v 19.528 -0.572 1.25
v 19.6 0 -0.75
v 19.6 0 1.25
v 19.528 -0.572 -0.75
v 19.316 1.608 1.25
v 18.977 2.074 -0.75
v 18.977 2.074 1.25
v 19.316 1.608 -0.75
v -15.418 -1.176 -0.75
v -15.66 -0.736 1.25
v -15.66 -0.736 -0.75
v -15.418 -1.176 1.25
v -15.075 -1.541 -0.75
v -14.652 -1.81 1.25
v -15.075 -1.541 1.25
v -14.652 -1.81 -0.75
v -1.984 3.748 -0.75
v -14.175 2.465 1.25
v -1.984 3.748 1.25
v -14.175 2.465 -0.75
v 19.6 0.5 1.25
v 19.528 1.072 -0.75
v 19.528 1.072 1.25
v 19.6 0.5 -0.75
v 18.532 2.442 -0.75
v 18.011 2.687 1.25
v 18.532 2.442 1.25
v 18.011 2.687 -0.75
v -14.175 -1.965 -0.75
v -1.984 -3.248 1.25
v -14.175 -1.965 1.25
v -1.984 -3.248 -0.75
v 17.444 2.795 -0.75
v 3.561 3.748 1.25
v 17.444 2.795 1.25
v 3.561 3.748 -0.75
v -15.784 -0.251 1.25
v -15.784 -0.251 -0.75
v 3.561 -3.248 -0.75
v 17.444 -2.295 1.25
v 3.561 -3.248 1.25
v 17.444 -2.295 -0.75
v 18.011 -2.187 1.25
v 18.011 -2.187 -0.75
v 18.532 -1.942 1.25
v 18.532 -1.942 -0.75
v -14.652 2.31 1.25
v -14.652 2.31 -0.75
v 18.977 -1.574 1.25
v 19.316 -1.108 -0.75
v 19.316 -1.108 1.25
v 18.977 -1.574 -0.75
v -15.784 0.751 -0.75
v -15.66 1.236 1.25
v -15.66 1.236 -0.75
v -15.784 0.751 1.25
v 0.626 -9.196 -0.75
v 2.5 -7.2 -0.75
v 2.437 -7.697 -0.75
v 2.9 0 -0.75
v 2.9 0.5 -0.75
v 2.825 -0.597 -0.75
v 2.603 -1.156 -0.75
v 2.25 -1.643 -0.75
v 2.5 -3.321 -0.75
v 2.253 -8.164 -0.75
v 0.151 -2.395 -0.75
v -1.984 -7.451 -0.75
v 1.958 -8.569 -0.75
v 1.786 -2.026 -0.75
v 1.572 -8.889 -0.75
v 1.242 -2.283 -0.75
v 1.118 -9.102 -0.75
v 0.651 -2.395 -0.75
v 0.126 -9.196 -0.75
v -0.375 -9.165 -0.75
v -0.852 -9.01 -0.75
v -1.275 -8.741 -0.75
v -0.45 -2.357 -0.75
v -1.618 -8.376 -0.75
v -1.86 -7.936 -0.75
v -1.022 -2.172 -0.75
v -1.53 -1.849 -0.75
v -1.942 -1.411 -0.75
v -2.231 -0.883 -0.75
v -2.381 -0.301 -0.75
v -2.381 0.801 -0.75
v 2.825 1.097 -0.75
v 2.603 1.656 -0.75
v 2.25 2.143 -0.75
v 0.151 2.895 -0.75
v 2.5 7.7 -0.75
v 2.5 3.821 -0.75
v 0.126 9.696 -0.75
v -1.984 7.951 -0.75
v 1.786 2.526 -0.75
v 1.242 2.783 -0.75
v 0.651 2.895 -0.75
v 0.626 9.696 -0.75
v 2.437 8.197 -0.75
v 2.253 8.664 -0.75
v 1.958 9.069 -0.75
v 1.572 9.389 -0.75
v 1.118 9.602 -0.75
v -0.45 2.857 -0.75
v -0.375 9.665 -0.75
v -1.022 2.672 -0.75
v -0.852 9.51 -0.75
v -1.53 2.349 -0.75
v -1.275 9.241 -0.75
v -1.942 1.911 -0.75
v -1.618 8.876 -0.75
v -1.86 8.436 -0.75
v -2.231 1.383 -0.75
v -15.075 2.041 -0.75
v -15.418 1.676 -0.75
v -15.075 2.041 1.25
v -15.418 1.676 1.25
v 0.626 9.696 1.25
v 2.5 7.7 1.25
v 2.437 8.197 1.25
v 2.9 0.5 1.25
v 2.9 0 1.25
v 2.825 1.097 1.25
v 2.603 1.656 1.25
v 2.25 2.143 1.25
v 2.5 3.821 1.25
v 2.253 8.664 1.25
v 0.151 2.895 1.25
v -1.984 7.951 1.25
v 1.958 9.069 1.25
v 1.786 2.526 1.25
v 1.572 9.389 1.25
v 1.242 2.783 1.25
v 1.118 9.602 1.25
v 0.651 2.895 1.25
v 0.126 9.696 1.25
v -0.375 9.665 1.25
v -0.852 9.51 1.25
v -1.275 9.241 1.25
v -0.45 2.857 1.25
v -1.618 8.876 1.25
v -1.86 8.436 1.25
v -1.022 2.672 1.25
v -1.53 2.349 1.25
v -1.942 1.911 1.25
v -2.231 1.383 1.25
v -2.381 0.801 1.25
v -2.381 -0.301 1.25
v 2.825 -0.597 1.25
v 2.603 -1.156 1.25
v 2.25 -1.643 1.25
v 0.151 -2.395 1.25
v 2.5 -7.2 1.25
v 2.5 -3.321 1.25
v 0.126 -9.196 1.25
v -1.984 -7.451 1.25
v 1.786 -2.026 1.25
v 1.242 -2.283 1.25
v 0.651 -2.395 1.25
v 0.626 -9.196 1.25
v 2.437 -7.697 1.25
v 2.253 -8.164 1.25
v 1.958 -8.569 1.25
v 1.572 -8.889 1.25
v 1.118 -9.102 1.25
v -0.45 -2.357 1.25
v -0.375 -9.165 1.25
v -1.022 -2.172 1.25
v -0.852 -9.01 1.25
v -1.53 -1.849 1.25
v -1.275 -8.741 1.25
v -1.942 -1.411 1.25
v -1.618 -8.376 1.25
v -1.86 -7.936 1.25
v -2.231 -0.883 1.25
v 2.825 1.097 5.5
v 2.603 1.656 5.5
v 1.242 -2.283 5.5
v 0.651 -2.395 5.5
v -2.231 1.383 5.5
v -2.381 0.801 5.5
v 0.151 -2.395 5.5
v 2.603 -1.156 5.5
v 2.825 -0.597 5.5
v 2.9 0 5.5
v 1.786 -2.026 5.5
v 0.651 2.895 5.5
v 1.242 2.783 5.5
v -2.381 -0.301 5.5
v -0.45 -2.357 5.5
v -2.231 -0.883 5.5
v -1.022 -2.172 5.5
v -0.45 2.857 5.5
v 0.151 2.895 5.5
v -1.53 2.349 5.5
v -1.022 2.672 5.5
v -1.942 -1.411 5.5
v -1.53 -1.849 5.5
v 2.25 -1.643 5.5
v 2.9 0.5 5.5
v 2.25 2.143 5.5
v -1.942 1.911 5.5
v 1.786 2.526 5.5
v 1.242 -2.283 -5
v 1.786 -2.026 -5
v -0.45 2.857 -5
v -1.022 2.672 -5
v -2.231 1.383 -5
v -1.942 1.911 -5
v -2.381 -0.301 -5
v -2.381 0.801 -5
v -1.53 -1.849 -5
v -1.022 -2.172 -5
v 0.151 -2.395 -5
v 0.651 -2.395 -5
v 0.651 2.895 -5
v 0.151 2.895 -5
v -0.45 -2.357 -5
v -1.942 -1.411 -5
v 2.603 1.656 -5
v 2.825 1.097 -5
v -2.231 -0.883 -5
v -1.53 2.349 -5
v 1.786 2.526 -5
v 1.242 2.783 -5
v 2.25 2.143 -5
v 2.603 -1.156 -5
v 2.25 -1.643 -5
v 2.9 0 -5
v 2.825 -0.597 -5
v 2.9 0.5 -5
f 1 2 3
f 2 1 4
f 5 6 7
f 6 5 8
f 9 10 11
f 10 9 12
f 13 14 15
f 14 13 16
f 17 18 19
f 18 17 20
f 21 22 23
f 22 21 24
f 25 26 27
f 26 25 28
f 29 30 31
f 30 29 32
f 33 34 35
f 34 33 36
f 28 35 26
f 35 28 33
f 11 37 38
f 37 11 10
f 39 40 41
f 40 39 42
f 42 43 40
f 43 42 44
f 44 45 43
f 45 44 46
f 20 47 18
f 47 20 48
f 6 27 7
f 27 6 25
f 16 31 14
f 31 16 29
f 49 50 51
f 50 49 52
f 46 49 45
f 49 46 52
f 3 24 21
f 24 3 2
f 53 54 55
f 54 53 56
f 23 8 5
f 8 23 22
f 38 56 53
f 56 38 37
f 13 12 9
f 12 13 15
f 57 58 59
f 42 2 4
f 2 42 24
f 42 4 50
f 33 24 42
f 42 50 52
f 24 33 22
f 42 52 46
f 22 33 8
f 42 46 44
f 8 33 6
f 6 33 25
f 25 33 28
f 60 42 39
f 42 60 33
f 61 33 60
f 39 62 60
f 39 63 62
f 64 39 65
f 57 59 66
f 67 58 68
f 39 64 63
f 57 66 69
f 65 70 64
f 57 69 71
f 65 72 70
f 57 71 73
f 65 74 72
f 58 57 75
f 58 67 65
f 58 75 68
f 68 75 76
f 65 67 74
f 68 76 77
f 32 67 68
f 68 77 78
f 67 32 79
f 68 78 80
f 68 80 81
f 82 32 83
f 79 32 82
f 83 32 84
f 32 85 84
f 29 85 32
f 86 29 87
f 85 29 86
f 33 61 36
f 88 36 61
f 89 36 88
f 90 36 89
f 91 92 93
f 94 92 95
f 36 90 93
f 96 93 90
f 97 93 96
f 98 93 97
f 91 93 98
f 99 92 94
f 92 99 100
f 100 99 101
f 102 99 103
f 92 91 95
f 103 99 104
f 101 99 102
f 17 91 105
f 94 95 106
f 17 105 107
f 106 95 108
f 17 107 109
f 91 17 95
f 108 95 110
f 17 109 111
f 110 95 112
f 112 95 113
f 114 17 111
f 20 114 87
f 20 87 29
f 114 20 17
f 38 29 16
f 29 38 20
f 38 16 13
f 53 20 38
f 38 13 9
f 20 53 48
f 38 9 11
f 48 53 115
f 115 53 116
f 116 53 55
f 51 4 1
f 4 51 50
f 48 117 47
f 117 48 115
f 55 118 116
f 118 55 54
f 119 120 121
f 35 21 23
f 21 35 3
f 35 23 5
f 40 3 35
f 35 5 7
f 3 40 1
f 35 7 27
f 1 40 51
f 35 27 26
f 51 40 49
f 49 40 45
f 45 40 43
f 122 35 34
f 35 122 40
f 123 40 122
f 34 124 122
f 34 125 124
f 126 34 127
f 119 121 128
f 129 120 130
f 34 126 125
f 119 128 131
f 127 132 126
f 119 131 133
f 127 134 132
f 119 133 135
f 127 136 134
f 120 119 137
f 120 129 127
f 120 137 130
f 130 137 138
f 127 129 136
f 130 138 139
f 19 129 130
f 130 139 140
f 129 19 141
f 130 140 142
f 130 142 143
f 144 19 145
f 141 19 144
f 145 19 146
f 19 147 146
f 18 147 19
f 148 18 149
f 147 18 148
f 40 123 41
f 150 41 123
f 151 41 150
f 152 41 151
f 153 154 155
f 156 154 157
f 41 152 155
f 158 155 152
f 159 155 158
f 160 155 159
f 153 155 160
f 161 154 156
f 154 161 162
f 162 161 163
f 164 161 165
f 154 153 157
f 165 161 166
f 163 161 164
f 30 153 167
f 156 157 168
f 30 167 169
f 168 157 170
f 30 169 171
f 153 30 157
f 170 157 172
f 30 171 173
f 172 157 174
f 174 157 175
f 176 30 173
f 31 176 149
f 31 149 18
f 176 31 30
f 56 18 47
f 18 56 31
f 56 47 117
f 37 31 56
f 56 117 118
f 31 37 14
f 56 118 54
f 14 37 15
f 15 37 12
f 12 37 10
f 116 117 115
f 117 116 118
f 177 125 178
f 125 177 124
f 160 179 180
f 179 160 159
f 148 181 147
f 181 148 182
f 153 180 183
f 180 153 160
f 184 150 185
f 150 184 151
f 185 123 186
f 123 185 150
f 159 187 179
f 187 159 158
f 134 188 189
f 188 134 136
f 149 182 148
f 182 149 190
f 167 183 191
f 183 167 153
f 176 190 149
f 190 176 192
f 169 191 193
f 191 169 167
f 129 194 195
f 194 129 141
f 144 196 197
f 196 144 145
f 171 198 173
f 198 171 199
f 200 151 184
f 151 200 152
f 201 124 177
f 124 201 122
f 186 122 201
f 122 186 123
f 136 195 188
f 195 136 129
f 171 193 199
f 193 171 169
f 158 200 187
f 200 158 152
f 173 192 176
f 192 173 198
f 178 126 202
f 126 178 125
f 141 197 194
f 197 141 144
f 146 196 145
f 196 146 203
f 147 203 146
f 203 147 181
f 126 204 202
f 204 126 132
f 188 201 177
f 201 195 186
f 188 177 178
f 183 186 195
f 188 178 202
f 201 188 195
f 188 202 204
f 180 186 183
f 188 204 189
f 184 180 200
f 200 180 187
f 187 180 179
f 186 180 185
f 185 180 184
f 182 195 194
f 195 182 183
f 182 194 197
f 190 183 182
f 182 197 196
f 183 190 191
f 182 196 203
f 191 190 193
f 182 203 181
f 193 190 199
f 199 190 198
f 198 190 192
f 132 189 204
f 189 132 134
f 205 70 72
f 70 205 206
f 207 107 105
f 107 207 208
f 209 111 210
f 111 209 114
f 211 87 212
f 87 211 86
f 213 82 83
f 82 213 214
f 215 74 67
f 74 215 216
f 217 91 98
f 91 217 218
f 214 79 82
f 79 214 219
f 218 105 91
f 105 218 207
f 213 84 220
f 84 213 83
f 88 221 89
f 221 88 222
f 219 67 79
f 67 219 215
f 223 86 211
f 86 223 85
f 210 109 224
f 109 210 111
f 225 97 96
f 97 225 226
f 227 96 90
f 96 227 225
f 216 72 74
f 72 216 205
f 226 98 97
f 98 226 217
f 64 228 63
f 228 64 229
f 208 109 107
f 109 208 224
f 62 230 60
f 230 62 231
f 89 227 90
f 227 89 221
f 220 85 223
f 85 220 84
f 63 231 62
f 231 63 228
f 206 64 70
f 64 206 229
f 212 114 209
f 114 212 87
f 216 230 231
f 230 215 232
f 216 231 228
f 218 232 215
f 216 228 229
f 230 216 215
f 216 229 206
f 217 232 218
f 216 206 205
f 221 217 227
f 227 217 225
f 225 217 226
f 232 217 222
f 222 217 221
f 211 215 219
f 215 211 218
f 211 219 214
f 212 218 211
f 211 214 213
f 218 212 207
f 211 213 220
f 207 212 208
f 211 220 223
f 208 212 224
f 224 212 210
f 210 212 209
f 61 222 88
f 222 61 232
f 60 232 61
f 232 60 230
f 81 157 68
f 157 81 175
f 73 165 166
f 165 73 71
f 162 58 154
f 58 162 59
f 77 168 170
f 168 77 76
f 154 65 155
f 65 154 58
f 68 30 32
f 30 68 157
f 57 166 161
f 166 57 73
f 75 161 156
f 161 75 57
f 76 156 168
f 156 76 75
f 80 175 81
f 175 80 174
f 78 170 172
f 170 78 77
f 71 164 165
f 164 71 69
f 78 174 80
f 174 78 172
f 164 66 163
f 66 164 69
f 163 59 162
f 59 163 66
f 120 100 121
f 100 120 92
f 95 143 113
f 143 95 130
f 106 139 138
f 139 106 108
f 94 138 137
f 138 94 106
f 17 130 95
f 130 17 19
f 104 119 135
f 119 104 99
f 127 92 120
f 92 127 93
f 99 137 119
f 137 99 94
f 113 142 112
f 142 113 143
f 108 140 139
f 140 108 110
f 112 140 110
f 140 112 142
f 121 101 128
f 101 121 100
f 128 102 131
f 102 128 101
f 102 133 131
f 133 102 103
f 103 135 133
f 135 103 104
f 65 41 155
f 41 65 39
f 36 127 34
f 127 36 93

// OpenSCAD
module servohorn_boundaries() {
minkowski() {
union() {
hull() {
translate([19-2.2,0,0]) cylinder(r=2.3,h=1.5,center=true);
cylinder(r=6.9/2,h=1.5,center=true);
translate([-16+2.2,0,0]) cylinder(r=2,h=1.5,center=true);
}
hull() {
translate([0,16.4/2-1,0]) cylinder(r=2,h=1.5,center=true);
translate([0,-16.4/2+1,0]) cylinder(r=2,h=1.5,center=true);
}
cylinder(r=4.8/2,h=10,center=true);
}
cube([0.5,0.5,0.5]);
}
}

servohorn_boundaries();
$fn=25;
